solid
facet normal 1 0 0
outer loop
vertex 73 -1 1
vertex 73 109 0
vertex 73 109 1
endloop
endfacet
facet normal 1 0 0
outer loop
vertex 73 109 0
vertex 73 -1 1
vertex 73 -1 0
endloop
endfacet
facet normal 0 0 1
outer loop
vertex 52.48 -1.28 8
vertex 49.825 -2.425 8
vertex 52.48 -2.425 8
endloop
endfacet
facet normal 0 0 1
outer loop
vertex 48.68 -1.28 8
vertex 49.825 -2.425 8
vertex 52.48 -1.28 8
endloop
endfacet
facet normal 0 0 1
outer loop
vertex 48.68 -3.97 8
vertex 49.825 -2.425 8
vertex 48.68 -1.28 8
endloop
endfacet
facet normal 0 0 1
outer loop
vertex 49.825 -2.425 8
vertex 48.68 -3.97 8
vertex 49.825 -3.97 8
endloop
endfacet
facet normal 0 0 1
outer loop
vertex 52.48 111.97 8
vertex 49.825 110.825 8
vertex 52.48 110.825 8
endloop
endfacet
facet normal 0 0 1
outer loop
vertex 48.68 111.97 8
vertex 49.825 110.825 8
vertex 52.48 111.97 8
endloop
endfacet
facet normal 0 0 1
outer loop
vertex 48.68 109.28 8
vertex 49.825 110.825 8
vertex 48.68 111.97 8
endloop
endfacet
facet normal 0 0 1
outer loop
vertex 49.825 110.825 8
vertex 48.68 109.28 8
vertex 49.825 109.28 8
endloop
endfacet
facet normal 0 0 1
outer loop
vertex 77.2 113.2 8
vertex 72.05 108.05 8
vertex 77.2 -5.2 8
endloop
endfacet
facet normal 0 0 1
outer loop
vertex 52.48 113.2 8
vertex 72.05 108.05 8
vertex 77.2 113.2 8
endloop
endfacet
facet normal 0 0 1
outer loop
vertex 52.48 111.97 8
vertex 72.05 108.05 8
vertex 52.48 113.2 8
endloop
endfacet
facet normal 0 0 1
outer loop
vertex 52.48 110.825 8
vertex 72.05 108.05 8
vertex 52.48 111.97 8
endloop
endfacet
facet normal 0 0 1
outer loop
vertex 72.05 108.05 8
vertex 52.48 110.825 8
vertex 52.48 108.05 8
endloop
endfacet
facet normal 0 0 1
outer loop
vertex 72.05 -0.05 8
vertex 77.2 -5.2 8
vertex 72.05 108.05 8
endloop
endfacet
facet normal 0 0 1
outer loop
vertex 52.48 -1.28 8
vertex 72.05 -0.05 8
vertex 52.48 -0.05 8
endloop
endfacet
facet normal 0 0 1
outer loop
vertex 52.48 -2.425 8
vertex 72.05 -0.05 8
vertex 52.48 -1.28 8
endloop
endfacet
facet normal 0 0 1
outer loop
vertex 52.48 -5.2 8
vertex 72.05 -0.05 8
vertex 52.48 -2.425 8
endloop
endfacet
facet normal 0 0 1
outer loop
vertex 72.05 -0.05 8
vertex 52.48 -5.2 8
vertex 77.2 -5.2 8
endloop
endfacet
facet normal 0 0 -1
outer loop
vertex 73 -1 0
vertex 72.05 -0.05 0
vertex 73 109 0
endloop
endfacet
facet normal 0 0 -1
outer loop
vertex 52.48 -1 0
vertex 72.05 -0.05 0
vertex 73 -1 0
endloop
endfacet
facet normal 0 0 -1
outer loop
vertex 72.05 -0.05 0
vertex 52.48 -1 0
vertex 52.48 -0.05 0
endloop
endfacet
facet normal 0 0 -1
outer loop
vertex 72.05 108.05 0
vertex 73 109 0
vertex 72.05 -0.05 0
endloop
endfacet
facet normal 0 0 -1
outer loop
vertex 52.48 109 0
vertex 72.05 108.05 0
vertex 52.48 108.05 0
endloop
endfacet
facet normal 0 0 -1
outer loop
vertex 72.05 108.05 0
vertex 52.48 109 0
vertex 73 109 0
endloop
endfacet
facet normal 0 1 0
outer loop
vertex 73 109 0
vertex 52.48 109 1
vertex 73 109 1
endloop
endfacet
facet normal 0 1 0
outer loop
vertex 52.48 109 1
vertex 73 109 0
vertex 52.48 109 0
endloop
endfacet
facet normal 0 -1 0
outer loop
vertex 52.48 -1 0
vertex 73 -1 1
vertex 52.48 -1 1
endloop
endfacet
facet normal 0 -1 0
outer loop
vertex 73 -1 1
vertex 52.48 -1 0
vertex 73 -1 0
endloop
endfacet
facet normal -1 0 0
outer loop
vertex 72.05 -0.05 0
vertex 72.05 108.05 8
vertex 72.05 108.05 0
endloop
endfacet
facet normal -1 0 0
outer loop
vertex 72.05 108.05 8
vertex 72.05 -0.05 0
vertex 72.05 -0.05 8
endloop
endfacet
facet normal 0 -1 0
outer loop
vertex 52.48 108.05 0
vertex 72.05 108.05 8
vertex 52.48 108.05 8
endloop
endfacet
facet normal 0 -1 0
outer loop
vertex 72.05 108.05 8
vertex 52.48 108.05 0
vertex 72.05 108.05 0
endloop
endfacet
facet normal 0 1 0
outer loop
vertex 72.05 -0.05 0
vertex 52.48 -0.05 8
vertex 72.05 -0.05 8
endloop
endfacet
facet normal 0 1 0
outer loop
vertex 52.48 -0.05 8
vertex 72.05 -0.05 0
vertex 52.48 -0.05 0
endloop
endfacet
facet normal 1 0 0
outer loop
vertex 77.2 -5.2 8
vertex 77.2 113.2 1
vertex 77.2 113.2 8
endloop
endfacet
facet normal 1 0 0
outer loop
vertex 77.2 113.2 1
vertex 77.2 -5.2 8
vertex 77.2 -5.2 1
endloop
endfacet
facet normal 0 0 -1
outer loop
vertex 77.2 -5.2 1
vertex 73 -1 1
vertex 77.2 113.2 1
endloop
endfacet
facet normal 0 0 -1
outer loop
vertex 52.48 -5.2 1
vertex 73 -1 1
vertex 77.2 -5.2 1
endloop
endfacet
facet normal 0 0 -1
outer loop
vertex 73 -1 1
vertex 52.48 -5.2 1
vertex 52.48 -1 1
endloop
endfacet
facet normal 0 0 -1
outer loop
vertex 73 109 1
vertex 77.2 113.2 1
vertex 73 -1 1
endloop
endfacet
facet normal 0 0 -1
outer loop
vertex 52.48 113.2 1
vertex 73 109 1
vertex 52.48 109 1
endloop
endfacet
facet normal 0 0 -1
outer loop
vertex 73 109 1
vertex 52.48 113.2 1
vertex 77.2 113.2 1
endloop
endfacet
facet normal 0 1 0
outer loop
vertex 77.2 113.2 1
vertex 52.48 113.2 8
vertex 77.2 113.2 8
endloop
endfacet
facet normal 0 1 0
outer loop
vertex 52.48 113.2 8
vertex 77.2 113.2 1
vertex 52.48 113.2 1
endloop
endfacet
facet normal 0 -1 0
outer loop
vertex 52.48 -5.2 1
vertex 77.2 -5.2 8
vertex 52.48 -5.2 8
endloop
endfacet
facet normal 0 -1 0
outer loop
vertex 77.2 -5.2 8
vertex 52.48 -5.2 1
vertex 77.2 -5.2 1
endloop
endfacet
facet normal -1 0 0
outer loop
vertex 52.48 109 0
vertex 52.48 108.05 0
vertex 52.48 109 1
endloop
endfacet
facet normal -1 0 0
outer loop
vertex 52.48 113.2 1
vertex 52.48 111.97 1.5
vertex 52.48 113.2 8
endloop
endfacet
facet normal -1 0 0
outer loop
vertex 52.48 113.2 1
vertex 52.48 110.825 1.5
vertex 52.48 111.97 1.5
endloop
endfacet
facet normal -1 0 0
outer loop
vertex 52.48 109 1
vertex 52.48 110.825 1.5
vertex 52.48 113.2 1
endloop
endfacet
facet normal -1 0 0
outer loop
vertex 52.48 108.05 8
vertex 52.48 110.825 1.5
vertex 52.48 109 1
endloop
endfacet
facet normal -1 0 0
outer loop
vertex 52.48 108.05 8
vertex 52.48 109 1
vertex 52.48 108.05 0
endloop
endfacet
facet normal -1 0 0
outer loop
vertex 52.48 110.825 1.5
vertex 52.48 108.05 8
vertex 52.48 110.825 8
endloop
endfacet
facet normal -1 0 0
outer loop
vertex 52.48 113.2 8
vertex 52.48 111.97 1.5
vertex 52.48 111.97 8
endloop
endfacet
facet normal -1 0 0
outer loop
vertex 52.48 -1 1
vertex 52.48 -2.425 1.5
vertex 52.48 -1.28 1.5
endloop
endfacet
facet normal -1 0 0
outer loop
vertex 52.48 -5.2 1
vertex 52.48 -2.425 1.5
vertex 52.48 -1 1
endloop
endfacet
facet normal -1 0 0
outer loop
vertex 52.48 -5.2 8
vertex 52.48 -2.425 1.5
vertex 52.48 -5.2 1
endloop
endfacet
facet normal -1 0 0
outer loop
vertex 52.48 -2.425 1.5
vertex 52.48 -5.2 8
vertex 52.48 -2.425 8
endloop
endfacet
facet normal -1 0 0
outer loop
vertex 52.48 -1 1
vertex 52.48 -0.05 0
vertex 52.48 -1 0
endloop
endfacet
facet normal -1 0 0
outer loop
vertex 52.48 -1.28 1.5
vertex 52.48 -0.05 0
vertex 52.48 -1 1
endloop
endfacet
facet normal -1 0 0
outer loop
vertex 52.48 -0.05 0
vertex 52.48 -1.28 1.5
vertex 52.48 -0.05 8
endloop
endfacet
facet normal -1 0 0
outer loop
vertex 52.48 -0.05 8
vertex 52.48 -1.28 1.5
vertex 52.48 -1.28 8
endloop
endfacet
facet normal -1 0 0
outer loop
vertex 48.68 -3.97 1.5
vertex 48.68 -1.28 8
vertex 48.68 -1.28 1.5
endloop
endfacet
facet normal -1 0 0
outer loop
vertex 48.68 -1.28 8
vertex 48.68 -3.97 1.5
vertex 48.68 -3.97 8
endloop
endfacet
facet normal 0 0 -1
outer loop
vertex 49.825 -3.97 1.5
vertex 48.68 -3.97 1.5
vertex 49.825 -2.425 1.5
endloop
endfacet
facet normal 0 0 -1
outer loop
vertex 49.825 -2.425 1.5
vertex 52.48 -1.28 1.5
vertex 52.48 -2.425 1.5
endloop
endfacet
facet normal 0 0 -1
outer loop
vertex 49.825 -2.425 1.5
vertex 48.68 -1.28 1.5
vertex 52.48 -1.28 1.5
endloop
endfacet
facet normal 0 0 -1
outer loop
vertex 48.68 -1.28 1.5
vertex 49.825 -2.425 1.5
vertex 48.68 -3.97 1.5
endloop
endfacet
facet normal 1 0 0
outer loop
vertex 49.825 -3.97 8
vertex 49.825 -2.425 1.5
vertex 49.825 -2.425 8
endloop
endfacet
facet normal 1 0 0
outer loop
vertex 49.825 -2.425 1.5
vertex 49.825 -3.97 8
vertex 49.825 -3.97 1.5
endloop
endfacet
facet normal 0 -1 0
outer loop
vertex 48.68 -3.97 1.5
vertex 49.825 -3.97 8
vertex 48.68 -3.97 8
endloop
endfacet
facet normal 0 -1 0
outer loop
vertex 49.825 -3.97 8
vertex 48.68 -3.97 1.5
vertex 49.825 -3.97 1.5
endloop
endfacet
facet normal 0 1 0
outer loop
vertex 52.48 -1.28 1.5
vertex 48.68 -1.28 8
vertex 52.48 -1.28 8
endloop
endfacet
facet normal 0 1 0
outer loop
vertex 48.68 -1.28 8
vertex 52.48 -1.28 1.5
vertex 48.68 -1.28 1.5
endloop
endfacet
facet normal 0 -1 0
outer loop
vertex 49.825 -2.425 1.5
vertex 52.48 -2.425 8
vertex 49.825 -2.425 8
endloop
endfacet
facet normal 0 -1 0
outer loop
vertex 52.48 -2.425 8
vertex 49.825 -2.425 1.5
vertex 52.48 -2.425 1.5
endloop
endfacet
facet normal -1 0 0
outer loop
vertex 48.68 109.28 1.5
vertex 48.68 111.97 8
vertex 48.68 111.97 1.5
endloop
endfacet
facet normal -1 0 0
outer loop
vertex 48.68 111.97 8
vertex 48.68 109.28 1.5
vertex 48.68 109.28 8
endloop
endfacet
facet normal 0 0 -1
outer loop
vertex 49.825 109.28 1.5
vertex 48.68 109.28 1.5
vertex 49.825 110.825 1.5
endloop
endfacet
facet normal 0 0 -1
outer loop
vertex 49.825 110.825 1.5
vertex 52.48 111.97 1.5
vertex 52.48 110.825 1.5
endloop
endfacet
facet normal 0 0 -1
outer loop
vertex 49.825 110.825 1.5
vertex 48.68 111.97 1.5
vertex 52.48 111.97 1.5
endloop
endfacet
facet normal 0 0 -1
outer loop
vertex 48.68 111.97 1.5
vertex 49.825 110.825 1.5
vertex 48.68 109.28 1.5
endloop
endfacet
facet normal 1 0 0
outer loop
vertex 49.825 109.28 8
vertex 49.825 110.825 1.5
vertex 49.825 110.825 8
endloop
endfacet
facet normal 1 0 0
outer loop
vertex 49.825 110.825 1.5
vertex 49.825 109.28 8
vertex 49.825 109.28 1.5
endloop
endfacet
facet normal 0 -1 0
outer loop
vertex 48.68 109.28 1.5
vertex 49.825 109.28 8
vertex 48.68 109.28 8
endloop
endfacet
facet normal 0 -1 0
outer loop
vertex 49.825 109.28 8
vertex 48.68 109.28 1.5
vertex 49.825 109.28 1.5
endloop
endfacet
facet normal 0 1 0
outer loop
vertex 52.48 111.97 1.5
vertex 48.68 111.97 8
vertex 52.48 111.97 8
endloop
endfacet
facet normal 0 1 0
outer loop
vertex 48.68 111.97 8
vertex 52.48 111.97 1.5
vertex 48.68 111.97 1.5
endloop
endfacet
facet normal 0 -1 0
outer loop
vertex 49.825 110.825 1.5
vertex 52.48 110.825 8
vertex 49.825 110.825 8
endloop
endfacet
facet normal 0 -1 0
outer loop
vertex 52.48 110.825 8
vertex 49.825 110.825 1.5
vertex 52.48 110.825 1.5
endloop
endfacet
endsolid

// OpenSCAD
// Generated by SolidPython 1.0.4 on 2021-07-12 16:52:29


union() {
	union() {
		difference() {
			union() {
				difference() {
					translate(v = [-1.0000000000, -1.0000000000, 0]) {
						cube(size = [74.0000000000, 110.0000000000, 8]);
					}
					translate(v = [-0.0500000000, -0.0500000000, 0]) {
						cube(size = [72.1000000000, 108.1000000000, 8]);
					}
				}
				translate(v = [0, 0, 1]) {
					difference() {
						translate(v = [-5.2000000000, -5.2000000000, 0]) {
							cube(size = [82.4000000000, 118.4000000000, 7]);
						}
						translate(v = [-1.0000000000, -1.0000000000, 0]) {
							cube(size = [74.0000000000, 110.0000000000, 7]);
						}
					}
				}
			}
			translate(v = [-5.2000000000, -5.2000000000, 0]) {
				cube(size = [57.6800000000, 118.4000000000, 8]);
			}
		}
		translate(v = [48.4800000000, -4.1700000000, 0]) {
			translate(v = [0.2000000000, 0.2000000000, 0]) {
				translate(v = [0, 0, 1.5000000000]) {
					translate(v = [3.8000000000, 2.6900000000, 0]) {
						rotate(a = -180) {
							union() {
								translate(v = [2.6550000000, 0, 0]) {
									cube(size = [1.1450000000, 2.6900000000, 6.5000000000]);
								}
								cube(size = [3.8000000000, 1.1450000000, 6.5000000000]);
							}
						}
					}
				}
			}
		}
	}
	translate(v = [48.4800000000, 109.0800000000, 0]) {
		translate(v = [0.2000000000, 0.2000000000, 0]) {
			translate(v = [0, 0, 1.5000000000]) {
				translate(v = [3.8000000000, 2.6900000000, 0]) {
					rotate(a = -180) {
						union() {
							translate(v = [2.6550000000, 0, 0]) {
								cube(size = [1.1450000000, 2.6900000000, 6.5000000000]);
							}
							cube(size = [3.8000000000, 1.1450000000, 6.5000000000]);
						}
					}
				}
			}
		}
	}
}
